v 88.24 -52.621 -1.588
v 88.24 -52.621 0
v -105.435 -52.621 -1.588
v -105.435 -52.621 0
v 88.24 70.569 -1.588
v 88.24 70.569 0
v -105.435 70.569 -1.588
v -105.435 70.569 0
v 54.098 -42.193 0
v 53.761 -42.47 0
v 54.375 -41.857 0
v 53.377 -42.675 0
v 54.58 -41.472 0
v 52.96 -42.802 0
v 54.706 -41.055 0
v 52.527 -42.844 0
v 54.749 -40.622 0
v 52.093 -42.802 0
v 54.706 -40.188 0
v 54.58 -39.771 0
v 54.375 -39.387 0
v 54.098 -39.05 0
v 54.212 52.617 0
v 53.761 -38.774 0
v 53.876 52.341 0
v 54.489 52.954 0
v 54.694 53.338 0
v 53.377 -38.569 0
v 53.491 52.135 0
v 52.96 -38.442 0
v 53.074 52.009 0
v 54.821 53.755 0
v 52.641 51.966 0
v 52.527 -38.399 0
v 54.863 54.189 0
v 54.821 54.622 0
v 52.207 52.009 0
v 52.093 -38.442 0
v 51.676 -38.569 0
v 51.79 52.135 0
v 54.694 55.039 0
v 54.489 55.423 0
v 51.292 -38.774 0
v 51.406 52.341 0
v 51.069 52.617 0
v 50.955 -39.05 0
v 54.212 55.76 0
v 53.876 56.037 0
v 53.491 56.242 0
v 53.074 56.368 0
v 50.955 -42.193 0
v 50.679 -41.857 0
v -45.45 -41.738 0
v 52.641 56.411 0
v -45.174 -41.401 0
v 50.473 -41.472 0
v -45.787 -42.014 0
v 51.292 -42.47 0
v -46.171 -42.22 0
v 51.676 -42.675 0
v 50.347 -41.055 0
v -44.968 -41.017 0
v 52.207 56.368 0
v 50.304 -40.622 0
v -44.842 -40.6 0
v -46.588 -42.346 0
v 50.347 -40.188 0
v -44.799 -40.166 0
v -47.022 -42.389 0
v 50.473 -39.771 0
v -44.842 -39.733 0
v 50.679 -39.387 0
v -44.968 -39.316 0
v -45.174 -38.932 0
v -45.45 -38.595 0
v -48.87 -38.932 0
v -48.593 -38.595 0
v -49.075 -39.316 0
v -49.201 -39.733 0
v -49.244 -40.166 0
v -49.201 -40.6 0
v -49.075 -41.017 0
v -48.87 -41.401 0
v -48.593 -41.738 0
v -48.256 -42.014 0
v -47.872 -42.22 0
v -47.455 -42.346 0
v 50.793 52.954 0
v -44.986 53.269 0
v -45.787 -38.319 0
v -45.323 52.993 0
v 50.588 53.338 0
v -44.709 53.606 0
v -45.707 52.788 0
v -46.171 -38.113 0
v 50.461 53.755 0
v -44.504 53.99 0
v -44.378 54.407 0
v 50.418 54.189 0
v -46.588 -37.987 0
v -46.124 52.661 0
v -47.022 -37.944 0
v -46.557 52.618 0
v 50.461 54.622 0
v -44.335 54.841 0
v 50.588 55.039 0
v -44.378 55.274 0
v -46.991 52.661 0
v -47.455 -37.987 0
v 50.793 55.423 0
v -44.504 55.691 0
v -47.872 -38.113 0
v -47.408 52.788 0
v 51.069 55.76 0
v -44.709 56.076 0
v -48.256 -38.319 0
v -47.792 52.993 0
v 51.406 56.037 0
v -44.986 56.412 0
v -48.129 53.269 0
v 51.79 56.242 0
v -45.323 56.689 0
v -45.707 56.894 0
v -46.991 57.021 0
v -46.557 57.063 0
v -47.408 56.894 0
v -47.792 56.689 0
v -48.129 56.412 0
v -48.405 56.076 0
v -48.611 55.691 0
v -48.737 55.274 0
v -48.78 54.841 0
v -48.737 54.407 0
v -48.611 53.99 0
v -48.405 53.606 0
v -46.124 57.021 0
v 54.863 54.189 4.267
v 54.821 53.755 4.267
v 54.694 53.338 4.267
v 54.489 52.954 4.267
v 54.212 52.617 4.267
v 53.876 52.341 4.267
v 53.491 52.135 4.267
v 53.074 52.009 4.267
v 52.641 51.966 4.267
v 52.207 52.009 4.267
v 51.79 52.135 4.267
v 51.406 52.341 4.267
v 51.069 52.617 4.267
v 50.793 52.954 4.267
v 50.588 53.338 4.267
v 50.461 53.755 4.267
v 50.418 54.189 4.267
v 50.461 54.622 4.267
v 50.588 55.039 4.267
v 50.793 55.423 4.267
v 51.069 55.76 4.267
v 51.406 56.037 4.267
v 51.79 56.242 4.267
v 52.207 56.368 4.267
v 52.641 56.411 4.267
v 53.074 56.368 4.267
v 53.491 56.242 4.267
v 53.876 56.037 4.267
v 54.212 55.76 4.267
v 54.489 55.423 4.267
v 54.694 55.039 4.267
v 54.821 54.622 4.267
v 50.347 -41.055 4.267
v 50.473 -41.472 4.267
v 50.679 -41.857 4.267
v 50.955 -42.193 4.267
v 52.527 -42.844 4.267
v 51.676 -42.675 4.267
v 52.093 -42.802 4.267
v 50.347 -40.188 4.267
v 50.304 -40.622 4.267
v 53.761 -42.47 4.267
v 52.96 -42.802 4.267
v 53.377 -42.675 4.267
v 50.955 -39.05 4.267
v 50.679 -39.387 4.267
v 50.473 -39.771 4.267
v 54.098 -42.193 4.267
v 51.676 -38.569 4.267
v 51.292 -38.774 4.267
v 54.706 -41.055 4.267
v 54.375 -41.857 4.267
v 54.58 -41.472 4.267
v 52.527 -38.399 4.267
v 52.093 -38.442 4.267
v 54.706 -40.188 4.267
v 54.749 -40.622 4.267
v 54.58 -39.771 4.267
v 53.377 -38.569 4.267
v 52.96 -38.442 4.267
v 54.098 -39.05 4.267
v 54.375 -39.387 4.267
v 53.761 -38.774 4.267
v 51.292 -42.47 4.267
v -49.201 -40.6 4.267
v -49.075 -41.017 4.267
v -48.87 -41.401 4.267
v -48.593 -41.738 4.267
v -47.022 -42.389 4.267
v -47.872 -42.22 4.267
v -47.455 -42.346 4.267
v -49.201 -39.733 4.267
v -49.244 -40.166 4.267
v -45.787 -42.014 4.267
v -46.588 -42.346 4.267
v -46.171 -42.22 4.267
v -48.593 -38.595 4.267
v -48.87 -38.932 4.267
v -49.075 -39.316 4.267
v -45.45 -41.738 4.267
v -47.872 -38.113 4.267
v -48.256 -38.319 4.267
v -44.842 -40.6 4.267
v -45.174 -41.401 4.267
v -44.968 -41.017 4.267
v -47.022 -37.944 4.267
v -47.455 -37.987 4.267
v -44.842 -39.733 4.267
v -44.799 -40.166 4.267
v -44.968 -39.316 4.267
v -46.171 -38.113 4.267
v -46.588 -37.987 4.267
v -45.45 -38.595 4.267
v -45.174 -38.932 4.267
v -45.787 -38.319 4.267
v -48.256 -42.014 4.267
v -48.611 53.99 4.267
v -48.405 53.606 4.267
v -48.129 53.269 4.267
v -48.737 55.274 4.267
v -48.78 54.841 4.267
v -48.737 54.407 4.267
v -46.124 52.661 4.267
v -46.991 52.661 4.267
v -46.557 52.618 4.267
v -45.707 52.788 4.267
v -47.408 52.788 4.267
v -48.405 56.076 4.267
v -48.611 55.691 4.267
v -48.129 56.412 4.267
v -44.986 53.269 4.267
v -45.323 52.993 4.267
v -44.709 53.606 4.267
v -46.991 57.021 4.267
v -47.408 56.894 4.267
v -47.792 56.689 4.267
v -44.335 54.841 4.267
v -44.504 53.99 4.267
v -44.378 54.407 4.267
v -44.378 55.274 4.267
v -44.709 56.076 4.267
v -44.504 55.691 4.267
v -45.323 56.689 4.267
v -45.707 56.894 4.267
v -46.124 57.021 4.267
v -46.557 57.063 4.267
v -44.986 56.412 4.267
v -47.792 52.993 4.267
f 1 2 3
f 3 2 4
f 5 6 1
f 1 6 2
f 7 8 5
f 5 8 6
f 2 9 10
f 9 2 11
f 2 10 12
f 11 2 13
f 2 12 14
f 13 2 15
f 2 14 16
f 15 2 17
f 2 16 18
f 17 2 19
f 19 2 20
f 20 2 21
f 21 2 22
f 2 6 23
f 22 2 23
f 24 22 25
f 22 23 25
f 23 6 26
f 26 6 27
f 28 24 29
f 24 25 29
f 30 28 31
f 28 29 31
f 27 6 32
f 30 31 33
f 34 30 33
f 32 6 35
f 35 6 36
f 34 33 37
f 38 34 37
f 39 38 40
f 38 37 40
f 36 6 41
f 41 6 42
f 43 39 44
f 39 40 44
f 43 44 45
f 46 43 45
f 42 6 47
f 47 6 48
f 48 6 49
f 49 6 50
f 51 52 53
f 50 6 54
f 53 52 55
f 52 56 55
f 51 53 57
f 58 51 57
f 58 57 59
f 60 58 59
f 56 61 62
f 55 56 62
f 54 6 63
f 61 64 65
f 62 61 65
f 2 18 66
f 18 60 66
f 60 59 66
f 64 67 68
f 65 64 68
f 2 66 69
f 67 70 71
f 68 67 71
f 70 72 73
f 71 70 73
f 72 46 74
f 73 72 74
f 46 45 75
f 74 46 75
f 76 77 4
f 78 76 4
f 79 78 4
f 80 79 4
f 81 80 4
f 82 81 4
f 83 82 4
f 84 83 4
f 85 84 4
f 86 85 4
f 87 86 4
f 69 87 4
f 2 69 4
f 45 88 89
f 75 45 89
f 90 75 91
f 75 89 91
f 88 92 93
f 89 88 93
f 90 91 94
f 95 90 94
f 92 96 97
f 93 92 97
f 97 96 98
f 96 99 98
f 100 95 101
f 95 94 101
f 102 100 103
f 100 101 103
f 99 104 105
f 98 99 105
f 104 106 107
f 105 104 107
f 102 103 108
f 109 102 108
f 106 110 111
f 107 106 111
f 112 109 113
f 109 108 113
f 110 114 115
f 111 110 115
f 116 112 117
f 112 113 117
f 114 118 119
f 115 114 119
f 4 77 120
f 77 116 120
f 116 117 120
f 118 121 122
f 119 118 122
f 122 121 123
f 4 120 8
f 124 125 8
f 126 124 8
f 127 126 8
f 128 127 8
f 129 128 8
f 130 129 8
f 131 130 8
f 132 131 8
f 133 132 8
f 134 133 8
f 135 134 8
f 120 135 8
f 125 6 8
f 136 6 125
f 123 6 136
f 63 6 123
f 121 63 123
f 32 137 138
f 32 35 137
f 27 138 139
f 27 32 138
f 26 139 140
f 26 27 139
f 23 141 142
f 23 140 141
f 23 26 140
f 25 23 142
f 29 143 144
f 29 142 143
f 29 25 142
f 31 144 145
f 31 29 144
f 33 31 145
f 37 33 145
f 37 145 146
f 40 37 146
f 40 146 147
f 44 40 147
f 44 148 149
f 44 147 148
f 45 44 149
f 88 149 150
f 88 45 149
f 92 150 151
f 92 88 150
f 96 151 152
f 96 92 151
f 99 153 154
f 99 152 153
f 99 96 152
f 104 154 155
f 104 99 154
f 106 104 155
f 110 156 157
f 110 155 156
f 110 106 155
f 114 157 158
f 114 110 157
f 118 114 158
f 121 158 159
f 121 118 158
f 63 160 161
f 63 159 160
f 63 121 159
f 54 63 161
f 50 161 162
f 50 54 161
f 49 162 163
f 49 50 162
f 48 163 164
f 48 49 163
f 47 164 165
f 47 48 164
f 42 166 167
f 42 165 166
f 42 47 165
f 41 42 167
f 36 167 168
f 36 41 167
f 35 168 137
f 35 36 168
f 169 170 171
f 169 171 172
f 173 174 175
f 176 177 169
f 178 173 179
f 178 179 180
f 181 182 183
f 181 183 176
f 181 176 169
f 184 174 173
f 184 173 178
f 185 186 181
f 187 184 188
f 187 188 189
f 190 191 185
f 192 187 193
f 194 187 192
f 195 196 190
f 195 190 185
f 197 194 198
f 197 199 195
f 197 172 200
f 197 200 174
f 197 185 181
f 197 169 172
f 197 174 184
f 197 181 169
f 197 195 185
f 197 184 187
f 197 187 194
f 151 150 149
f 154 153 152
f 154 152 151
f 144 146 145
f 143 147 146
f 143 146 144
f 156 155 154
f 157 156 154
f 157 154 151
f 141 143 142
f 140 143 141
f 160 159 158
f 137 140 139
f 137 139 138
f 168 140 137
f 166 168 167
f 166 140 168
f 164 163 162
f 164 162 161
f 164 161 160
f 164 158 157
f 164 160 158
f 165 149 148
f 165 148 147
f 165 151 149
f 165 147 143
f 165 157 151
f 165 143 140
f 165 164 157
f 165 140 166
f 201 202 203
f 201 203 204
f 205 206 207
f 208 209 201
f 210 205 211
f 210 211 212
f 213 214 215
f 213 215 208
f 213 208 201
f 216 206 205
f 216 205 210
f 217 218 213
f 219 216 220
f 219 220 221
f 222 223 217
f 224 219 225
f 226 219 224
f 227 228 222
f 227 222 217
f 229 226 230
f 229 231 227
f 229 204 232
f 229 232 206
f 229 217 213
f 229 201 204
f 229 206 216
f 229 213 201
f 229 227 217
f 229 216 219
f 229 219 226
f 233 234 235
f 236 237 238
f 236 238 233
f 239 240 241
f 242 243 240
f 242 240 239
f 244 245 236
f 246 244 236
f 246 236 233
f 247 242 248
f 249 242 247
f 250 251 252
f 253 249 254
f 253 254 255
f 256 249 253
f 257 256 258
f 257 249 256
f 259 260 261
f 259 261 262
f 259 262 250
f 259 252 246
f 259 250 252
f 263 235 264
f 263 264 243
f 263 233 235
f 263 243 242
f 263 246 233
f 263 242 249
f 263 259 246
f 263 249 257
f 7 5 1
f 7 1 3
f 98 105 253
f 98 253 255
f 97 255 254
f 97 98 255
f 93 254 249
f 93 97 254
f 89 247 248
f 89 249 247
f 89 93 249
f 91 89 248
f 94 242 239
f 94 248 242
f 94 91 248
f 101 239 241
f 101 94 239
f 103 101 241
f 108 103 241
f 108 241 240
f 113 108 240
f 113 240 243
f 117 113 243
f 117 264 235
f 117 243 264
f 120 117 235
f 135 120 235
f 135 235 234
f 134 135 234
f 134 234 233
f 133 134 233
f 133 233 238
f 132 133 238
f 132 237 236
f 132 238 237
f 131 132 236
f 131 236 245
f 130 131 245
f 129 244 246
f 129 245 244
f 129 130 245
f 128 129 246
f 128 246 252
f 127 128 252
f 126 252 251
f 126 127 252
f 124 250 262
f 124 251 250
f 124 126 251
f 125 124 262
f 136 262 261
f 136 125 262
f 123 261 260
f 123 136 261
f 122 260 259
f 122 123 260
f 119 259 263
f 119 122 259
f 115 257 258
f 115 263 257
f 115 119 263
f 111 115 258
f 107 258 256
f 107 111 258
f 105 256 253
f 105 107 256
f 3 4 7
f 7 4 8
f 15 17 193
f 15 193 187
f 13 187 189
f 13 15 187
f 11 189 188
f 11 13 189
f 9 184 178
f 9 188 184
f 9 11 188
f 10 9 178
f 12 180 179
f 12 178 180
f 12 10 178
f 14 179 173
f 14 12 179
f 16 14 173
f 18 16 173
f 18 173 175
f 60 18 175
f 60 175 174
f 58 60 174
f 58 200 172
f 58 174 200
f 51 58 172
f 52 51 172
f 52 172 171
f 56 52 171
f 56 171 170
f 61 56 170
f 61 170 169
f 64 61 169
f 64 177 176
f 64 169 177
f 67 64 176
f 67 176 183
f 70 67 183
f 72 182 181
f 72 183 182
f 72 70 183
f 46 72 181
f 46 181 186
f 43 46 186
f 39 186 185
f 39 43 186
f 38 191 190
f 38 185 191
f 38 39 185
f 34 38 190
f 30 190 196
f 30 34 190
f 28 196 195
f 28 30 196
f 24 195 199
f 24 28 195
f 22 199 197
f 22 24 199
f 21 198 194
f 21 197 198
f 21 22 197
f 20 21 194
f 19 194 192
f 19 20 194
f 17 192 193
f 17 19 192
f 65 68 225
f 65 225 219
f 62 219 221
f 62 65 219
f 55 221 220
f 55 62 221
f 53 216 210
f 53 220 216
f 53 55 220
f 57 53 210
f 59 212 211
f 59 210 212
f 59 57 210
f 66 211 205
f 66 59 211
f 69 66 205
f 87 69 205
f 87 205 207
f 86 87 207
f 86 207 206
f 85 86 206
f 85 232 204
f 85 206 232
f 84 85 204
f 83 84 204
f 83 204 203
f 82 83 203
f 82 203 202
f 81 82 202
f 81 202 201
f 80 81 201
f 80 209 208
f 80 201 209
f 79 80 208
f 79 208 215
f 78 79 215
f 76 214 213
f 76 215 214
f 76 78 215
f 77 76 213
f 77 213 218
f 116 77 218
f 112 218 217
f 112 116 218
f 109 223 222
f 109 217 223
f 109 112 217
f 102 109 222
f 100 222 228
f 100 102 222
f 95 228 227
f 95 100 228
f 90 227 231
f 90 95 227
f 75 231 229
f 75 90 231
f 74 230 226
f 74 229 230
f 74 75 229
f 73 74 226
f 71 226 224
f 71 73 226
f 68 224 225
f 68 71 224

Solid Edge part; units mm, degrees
sketch "Sketch1" plane through (0, 0, 0) normal (0, 0, 1) x (1, 0, 0)
  line L0 (88.2402, -52.6213) -> (-105.4348, -52.6213)
  line L1 (-105.4348, -52.6213) -> (-105.4348, 70.5687)
  line L2 (-105.4348, 70.5687) -> (88.2402, 70.5687)
  line L3 (88.2402, 70.5687) -> (88.2402, -52.6213)
extrude "Protrusion1" add sketch "Sketch1" against normal blind 1.5875
sketch "Sketch2" plane through (0, 0, 0) normal (0, 0, 1) x (1, 0, 0)
  circle A0 centre (-47.0216, -40.1665) radius 2.2225
  circle A1 centre (-46.5574, 54.8409) radius 2.2225
  circle A2 centre (52.6409, 54.1886) radius 2.2225
  circle A3 centre (52.5267, -40.6219) radius 2.2225
  dimension "D1" = 193.675
  dimension "D2" = 123.19
extrude "Protrusion2" add sketch "Sketch2" along normal up to vertex (4.2672 mm away)
